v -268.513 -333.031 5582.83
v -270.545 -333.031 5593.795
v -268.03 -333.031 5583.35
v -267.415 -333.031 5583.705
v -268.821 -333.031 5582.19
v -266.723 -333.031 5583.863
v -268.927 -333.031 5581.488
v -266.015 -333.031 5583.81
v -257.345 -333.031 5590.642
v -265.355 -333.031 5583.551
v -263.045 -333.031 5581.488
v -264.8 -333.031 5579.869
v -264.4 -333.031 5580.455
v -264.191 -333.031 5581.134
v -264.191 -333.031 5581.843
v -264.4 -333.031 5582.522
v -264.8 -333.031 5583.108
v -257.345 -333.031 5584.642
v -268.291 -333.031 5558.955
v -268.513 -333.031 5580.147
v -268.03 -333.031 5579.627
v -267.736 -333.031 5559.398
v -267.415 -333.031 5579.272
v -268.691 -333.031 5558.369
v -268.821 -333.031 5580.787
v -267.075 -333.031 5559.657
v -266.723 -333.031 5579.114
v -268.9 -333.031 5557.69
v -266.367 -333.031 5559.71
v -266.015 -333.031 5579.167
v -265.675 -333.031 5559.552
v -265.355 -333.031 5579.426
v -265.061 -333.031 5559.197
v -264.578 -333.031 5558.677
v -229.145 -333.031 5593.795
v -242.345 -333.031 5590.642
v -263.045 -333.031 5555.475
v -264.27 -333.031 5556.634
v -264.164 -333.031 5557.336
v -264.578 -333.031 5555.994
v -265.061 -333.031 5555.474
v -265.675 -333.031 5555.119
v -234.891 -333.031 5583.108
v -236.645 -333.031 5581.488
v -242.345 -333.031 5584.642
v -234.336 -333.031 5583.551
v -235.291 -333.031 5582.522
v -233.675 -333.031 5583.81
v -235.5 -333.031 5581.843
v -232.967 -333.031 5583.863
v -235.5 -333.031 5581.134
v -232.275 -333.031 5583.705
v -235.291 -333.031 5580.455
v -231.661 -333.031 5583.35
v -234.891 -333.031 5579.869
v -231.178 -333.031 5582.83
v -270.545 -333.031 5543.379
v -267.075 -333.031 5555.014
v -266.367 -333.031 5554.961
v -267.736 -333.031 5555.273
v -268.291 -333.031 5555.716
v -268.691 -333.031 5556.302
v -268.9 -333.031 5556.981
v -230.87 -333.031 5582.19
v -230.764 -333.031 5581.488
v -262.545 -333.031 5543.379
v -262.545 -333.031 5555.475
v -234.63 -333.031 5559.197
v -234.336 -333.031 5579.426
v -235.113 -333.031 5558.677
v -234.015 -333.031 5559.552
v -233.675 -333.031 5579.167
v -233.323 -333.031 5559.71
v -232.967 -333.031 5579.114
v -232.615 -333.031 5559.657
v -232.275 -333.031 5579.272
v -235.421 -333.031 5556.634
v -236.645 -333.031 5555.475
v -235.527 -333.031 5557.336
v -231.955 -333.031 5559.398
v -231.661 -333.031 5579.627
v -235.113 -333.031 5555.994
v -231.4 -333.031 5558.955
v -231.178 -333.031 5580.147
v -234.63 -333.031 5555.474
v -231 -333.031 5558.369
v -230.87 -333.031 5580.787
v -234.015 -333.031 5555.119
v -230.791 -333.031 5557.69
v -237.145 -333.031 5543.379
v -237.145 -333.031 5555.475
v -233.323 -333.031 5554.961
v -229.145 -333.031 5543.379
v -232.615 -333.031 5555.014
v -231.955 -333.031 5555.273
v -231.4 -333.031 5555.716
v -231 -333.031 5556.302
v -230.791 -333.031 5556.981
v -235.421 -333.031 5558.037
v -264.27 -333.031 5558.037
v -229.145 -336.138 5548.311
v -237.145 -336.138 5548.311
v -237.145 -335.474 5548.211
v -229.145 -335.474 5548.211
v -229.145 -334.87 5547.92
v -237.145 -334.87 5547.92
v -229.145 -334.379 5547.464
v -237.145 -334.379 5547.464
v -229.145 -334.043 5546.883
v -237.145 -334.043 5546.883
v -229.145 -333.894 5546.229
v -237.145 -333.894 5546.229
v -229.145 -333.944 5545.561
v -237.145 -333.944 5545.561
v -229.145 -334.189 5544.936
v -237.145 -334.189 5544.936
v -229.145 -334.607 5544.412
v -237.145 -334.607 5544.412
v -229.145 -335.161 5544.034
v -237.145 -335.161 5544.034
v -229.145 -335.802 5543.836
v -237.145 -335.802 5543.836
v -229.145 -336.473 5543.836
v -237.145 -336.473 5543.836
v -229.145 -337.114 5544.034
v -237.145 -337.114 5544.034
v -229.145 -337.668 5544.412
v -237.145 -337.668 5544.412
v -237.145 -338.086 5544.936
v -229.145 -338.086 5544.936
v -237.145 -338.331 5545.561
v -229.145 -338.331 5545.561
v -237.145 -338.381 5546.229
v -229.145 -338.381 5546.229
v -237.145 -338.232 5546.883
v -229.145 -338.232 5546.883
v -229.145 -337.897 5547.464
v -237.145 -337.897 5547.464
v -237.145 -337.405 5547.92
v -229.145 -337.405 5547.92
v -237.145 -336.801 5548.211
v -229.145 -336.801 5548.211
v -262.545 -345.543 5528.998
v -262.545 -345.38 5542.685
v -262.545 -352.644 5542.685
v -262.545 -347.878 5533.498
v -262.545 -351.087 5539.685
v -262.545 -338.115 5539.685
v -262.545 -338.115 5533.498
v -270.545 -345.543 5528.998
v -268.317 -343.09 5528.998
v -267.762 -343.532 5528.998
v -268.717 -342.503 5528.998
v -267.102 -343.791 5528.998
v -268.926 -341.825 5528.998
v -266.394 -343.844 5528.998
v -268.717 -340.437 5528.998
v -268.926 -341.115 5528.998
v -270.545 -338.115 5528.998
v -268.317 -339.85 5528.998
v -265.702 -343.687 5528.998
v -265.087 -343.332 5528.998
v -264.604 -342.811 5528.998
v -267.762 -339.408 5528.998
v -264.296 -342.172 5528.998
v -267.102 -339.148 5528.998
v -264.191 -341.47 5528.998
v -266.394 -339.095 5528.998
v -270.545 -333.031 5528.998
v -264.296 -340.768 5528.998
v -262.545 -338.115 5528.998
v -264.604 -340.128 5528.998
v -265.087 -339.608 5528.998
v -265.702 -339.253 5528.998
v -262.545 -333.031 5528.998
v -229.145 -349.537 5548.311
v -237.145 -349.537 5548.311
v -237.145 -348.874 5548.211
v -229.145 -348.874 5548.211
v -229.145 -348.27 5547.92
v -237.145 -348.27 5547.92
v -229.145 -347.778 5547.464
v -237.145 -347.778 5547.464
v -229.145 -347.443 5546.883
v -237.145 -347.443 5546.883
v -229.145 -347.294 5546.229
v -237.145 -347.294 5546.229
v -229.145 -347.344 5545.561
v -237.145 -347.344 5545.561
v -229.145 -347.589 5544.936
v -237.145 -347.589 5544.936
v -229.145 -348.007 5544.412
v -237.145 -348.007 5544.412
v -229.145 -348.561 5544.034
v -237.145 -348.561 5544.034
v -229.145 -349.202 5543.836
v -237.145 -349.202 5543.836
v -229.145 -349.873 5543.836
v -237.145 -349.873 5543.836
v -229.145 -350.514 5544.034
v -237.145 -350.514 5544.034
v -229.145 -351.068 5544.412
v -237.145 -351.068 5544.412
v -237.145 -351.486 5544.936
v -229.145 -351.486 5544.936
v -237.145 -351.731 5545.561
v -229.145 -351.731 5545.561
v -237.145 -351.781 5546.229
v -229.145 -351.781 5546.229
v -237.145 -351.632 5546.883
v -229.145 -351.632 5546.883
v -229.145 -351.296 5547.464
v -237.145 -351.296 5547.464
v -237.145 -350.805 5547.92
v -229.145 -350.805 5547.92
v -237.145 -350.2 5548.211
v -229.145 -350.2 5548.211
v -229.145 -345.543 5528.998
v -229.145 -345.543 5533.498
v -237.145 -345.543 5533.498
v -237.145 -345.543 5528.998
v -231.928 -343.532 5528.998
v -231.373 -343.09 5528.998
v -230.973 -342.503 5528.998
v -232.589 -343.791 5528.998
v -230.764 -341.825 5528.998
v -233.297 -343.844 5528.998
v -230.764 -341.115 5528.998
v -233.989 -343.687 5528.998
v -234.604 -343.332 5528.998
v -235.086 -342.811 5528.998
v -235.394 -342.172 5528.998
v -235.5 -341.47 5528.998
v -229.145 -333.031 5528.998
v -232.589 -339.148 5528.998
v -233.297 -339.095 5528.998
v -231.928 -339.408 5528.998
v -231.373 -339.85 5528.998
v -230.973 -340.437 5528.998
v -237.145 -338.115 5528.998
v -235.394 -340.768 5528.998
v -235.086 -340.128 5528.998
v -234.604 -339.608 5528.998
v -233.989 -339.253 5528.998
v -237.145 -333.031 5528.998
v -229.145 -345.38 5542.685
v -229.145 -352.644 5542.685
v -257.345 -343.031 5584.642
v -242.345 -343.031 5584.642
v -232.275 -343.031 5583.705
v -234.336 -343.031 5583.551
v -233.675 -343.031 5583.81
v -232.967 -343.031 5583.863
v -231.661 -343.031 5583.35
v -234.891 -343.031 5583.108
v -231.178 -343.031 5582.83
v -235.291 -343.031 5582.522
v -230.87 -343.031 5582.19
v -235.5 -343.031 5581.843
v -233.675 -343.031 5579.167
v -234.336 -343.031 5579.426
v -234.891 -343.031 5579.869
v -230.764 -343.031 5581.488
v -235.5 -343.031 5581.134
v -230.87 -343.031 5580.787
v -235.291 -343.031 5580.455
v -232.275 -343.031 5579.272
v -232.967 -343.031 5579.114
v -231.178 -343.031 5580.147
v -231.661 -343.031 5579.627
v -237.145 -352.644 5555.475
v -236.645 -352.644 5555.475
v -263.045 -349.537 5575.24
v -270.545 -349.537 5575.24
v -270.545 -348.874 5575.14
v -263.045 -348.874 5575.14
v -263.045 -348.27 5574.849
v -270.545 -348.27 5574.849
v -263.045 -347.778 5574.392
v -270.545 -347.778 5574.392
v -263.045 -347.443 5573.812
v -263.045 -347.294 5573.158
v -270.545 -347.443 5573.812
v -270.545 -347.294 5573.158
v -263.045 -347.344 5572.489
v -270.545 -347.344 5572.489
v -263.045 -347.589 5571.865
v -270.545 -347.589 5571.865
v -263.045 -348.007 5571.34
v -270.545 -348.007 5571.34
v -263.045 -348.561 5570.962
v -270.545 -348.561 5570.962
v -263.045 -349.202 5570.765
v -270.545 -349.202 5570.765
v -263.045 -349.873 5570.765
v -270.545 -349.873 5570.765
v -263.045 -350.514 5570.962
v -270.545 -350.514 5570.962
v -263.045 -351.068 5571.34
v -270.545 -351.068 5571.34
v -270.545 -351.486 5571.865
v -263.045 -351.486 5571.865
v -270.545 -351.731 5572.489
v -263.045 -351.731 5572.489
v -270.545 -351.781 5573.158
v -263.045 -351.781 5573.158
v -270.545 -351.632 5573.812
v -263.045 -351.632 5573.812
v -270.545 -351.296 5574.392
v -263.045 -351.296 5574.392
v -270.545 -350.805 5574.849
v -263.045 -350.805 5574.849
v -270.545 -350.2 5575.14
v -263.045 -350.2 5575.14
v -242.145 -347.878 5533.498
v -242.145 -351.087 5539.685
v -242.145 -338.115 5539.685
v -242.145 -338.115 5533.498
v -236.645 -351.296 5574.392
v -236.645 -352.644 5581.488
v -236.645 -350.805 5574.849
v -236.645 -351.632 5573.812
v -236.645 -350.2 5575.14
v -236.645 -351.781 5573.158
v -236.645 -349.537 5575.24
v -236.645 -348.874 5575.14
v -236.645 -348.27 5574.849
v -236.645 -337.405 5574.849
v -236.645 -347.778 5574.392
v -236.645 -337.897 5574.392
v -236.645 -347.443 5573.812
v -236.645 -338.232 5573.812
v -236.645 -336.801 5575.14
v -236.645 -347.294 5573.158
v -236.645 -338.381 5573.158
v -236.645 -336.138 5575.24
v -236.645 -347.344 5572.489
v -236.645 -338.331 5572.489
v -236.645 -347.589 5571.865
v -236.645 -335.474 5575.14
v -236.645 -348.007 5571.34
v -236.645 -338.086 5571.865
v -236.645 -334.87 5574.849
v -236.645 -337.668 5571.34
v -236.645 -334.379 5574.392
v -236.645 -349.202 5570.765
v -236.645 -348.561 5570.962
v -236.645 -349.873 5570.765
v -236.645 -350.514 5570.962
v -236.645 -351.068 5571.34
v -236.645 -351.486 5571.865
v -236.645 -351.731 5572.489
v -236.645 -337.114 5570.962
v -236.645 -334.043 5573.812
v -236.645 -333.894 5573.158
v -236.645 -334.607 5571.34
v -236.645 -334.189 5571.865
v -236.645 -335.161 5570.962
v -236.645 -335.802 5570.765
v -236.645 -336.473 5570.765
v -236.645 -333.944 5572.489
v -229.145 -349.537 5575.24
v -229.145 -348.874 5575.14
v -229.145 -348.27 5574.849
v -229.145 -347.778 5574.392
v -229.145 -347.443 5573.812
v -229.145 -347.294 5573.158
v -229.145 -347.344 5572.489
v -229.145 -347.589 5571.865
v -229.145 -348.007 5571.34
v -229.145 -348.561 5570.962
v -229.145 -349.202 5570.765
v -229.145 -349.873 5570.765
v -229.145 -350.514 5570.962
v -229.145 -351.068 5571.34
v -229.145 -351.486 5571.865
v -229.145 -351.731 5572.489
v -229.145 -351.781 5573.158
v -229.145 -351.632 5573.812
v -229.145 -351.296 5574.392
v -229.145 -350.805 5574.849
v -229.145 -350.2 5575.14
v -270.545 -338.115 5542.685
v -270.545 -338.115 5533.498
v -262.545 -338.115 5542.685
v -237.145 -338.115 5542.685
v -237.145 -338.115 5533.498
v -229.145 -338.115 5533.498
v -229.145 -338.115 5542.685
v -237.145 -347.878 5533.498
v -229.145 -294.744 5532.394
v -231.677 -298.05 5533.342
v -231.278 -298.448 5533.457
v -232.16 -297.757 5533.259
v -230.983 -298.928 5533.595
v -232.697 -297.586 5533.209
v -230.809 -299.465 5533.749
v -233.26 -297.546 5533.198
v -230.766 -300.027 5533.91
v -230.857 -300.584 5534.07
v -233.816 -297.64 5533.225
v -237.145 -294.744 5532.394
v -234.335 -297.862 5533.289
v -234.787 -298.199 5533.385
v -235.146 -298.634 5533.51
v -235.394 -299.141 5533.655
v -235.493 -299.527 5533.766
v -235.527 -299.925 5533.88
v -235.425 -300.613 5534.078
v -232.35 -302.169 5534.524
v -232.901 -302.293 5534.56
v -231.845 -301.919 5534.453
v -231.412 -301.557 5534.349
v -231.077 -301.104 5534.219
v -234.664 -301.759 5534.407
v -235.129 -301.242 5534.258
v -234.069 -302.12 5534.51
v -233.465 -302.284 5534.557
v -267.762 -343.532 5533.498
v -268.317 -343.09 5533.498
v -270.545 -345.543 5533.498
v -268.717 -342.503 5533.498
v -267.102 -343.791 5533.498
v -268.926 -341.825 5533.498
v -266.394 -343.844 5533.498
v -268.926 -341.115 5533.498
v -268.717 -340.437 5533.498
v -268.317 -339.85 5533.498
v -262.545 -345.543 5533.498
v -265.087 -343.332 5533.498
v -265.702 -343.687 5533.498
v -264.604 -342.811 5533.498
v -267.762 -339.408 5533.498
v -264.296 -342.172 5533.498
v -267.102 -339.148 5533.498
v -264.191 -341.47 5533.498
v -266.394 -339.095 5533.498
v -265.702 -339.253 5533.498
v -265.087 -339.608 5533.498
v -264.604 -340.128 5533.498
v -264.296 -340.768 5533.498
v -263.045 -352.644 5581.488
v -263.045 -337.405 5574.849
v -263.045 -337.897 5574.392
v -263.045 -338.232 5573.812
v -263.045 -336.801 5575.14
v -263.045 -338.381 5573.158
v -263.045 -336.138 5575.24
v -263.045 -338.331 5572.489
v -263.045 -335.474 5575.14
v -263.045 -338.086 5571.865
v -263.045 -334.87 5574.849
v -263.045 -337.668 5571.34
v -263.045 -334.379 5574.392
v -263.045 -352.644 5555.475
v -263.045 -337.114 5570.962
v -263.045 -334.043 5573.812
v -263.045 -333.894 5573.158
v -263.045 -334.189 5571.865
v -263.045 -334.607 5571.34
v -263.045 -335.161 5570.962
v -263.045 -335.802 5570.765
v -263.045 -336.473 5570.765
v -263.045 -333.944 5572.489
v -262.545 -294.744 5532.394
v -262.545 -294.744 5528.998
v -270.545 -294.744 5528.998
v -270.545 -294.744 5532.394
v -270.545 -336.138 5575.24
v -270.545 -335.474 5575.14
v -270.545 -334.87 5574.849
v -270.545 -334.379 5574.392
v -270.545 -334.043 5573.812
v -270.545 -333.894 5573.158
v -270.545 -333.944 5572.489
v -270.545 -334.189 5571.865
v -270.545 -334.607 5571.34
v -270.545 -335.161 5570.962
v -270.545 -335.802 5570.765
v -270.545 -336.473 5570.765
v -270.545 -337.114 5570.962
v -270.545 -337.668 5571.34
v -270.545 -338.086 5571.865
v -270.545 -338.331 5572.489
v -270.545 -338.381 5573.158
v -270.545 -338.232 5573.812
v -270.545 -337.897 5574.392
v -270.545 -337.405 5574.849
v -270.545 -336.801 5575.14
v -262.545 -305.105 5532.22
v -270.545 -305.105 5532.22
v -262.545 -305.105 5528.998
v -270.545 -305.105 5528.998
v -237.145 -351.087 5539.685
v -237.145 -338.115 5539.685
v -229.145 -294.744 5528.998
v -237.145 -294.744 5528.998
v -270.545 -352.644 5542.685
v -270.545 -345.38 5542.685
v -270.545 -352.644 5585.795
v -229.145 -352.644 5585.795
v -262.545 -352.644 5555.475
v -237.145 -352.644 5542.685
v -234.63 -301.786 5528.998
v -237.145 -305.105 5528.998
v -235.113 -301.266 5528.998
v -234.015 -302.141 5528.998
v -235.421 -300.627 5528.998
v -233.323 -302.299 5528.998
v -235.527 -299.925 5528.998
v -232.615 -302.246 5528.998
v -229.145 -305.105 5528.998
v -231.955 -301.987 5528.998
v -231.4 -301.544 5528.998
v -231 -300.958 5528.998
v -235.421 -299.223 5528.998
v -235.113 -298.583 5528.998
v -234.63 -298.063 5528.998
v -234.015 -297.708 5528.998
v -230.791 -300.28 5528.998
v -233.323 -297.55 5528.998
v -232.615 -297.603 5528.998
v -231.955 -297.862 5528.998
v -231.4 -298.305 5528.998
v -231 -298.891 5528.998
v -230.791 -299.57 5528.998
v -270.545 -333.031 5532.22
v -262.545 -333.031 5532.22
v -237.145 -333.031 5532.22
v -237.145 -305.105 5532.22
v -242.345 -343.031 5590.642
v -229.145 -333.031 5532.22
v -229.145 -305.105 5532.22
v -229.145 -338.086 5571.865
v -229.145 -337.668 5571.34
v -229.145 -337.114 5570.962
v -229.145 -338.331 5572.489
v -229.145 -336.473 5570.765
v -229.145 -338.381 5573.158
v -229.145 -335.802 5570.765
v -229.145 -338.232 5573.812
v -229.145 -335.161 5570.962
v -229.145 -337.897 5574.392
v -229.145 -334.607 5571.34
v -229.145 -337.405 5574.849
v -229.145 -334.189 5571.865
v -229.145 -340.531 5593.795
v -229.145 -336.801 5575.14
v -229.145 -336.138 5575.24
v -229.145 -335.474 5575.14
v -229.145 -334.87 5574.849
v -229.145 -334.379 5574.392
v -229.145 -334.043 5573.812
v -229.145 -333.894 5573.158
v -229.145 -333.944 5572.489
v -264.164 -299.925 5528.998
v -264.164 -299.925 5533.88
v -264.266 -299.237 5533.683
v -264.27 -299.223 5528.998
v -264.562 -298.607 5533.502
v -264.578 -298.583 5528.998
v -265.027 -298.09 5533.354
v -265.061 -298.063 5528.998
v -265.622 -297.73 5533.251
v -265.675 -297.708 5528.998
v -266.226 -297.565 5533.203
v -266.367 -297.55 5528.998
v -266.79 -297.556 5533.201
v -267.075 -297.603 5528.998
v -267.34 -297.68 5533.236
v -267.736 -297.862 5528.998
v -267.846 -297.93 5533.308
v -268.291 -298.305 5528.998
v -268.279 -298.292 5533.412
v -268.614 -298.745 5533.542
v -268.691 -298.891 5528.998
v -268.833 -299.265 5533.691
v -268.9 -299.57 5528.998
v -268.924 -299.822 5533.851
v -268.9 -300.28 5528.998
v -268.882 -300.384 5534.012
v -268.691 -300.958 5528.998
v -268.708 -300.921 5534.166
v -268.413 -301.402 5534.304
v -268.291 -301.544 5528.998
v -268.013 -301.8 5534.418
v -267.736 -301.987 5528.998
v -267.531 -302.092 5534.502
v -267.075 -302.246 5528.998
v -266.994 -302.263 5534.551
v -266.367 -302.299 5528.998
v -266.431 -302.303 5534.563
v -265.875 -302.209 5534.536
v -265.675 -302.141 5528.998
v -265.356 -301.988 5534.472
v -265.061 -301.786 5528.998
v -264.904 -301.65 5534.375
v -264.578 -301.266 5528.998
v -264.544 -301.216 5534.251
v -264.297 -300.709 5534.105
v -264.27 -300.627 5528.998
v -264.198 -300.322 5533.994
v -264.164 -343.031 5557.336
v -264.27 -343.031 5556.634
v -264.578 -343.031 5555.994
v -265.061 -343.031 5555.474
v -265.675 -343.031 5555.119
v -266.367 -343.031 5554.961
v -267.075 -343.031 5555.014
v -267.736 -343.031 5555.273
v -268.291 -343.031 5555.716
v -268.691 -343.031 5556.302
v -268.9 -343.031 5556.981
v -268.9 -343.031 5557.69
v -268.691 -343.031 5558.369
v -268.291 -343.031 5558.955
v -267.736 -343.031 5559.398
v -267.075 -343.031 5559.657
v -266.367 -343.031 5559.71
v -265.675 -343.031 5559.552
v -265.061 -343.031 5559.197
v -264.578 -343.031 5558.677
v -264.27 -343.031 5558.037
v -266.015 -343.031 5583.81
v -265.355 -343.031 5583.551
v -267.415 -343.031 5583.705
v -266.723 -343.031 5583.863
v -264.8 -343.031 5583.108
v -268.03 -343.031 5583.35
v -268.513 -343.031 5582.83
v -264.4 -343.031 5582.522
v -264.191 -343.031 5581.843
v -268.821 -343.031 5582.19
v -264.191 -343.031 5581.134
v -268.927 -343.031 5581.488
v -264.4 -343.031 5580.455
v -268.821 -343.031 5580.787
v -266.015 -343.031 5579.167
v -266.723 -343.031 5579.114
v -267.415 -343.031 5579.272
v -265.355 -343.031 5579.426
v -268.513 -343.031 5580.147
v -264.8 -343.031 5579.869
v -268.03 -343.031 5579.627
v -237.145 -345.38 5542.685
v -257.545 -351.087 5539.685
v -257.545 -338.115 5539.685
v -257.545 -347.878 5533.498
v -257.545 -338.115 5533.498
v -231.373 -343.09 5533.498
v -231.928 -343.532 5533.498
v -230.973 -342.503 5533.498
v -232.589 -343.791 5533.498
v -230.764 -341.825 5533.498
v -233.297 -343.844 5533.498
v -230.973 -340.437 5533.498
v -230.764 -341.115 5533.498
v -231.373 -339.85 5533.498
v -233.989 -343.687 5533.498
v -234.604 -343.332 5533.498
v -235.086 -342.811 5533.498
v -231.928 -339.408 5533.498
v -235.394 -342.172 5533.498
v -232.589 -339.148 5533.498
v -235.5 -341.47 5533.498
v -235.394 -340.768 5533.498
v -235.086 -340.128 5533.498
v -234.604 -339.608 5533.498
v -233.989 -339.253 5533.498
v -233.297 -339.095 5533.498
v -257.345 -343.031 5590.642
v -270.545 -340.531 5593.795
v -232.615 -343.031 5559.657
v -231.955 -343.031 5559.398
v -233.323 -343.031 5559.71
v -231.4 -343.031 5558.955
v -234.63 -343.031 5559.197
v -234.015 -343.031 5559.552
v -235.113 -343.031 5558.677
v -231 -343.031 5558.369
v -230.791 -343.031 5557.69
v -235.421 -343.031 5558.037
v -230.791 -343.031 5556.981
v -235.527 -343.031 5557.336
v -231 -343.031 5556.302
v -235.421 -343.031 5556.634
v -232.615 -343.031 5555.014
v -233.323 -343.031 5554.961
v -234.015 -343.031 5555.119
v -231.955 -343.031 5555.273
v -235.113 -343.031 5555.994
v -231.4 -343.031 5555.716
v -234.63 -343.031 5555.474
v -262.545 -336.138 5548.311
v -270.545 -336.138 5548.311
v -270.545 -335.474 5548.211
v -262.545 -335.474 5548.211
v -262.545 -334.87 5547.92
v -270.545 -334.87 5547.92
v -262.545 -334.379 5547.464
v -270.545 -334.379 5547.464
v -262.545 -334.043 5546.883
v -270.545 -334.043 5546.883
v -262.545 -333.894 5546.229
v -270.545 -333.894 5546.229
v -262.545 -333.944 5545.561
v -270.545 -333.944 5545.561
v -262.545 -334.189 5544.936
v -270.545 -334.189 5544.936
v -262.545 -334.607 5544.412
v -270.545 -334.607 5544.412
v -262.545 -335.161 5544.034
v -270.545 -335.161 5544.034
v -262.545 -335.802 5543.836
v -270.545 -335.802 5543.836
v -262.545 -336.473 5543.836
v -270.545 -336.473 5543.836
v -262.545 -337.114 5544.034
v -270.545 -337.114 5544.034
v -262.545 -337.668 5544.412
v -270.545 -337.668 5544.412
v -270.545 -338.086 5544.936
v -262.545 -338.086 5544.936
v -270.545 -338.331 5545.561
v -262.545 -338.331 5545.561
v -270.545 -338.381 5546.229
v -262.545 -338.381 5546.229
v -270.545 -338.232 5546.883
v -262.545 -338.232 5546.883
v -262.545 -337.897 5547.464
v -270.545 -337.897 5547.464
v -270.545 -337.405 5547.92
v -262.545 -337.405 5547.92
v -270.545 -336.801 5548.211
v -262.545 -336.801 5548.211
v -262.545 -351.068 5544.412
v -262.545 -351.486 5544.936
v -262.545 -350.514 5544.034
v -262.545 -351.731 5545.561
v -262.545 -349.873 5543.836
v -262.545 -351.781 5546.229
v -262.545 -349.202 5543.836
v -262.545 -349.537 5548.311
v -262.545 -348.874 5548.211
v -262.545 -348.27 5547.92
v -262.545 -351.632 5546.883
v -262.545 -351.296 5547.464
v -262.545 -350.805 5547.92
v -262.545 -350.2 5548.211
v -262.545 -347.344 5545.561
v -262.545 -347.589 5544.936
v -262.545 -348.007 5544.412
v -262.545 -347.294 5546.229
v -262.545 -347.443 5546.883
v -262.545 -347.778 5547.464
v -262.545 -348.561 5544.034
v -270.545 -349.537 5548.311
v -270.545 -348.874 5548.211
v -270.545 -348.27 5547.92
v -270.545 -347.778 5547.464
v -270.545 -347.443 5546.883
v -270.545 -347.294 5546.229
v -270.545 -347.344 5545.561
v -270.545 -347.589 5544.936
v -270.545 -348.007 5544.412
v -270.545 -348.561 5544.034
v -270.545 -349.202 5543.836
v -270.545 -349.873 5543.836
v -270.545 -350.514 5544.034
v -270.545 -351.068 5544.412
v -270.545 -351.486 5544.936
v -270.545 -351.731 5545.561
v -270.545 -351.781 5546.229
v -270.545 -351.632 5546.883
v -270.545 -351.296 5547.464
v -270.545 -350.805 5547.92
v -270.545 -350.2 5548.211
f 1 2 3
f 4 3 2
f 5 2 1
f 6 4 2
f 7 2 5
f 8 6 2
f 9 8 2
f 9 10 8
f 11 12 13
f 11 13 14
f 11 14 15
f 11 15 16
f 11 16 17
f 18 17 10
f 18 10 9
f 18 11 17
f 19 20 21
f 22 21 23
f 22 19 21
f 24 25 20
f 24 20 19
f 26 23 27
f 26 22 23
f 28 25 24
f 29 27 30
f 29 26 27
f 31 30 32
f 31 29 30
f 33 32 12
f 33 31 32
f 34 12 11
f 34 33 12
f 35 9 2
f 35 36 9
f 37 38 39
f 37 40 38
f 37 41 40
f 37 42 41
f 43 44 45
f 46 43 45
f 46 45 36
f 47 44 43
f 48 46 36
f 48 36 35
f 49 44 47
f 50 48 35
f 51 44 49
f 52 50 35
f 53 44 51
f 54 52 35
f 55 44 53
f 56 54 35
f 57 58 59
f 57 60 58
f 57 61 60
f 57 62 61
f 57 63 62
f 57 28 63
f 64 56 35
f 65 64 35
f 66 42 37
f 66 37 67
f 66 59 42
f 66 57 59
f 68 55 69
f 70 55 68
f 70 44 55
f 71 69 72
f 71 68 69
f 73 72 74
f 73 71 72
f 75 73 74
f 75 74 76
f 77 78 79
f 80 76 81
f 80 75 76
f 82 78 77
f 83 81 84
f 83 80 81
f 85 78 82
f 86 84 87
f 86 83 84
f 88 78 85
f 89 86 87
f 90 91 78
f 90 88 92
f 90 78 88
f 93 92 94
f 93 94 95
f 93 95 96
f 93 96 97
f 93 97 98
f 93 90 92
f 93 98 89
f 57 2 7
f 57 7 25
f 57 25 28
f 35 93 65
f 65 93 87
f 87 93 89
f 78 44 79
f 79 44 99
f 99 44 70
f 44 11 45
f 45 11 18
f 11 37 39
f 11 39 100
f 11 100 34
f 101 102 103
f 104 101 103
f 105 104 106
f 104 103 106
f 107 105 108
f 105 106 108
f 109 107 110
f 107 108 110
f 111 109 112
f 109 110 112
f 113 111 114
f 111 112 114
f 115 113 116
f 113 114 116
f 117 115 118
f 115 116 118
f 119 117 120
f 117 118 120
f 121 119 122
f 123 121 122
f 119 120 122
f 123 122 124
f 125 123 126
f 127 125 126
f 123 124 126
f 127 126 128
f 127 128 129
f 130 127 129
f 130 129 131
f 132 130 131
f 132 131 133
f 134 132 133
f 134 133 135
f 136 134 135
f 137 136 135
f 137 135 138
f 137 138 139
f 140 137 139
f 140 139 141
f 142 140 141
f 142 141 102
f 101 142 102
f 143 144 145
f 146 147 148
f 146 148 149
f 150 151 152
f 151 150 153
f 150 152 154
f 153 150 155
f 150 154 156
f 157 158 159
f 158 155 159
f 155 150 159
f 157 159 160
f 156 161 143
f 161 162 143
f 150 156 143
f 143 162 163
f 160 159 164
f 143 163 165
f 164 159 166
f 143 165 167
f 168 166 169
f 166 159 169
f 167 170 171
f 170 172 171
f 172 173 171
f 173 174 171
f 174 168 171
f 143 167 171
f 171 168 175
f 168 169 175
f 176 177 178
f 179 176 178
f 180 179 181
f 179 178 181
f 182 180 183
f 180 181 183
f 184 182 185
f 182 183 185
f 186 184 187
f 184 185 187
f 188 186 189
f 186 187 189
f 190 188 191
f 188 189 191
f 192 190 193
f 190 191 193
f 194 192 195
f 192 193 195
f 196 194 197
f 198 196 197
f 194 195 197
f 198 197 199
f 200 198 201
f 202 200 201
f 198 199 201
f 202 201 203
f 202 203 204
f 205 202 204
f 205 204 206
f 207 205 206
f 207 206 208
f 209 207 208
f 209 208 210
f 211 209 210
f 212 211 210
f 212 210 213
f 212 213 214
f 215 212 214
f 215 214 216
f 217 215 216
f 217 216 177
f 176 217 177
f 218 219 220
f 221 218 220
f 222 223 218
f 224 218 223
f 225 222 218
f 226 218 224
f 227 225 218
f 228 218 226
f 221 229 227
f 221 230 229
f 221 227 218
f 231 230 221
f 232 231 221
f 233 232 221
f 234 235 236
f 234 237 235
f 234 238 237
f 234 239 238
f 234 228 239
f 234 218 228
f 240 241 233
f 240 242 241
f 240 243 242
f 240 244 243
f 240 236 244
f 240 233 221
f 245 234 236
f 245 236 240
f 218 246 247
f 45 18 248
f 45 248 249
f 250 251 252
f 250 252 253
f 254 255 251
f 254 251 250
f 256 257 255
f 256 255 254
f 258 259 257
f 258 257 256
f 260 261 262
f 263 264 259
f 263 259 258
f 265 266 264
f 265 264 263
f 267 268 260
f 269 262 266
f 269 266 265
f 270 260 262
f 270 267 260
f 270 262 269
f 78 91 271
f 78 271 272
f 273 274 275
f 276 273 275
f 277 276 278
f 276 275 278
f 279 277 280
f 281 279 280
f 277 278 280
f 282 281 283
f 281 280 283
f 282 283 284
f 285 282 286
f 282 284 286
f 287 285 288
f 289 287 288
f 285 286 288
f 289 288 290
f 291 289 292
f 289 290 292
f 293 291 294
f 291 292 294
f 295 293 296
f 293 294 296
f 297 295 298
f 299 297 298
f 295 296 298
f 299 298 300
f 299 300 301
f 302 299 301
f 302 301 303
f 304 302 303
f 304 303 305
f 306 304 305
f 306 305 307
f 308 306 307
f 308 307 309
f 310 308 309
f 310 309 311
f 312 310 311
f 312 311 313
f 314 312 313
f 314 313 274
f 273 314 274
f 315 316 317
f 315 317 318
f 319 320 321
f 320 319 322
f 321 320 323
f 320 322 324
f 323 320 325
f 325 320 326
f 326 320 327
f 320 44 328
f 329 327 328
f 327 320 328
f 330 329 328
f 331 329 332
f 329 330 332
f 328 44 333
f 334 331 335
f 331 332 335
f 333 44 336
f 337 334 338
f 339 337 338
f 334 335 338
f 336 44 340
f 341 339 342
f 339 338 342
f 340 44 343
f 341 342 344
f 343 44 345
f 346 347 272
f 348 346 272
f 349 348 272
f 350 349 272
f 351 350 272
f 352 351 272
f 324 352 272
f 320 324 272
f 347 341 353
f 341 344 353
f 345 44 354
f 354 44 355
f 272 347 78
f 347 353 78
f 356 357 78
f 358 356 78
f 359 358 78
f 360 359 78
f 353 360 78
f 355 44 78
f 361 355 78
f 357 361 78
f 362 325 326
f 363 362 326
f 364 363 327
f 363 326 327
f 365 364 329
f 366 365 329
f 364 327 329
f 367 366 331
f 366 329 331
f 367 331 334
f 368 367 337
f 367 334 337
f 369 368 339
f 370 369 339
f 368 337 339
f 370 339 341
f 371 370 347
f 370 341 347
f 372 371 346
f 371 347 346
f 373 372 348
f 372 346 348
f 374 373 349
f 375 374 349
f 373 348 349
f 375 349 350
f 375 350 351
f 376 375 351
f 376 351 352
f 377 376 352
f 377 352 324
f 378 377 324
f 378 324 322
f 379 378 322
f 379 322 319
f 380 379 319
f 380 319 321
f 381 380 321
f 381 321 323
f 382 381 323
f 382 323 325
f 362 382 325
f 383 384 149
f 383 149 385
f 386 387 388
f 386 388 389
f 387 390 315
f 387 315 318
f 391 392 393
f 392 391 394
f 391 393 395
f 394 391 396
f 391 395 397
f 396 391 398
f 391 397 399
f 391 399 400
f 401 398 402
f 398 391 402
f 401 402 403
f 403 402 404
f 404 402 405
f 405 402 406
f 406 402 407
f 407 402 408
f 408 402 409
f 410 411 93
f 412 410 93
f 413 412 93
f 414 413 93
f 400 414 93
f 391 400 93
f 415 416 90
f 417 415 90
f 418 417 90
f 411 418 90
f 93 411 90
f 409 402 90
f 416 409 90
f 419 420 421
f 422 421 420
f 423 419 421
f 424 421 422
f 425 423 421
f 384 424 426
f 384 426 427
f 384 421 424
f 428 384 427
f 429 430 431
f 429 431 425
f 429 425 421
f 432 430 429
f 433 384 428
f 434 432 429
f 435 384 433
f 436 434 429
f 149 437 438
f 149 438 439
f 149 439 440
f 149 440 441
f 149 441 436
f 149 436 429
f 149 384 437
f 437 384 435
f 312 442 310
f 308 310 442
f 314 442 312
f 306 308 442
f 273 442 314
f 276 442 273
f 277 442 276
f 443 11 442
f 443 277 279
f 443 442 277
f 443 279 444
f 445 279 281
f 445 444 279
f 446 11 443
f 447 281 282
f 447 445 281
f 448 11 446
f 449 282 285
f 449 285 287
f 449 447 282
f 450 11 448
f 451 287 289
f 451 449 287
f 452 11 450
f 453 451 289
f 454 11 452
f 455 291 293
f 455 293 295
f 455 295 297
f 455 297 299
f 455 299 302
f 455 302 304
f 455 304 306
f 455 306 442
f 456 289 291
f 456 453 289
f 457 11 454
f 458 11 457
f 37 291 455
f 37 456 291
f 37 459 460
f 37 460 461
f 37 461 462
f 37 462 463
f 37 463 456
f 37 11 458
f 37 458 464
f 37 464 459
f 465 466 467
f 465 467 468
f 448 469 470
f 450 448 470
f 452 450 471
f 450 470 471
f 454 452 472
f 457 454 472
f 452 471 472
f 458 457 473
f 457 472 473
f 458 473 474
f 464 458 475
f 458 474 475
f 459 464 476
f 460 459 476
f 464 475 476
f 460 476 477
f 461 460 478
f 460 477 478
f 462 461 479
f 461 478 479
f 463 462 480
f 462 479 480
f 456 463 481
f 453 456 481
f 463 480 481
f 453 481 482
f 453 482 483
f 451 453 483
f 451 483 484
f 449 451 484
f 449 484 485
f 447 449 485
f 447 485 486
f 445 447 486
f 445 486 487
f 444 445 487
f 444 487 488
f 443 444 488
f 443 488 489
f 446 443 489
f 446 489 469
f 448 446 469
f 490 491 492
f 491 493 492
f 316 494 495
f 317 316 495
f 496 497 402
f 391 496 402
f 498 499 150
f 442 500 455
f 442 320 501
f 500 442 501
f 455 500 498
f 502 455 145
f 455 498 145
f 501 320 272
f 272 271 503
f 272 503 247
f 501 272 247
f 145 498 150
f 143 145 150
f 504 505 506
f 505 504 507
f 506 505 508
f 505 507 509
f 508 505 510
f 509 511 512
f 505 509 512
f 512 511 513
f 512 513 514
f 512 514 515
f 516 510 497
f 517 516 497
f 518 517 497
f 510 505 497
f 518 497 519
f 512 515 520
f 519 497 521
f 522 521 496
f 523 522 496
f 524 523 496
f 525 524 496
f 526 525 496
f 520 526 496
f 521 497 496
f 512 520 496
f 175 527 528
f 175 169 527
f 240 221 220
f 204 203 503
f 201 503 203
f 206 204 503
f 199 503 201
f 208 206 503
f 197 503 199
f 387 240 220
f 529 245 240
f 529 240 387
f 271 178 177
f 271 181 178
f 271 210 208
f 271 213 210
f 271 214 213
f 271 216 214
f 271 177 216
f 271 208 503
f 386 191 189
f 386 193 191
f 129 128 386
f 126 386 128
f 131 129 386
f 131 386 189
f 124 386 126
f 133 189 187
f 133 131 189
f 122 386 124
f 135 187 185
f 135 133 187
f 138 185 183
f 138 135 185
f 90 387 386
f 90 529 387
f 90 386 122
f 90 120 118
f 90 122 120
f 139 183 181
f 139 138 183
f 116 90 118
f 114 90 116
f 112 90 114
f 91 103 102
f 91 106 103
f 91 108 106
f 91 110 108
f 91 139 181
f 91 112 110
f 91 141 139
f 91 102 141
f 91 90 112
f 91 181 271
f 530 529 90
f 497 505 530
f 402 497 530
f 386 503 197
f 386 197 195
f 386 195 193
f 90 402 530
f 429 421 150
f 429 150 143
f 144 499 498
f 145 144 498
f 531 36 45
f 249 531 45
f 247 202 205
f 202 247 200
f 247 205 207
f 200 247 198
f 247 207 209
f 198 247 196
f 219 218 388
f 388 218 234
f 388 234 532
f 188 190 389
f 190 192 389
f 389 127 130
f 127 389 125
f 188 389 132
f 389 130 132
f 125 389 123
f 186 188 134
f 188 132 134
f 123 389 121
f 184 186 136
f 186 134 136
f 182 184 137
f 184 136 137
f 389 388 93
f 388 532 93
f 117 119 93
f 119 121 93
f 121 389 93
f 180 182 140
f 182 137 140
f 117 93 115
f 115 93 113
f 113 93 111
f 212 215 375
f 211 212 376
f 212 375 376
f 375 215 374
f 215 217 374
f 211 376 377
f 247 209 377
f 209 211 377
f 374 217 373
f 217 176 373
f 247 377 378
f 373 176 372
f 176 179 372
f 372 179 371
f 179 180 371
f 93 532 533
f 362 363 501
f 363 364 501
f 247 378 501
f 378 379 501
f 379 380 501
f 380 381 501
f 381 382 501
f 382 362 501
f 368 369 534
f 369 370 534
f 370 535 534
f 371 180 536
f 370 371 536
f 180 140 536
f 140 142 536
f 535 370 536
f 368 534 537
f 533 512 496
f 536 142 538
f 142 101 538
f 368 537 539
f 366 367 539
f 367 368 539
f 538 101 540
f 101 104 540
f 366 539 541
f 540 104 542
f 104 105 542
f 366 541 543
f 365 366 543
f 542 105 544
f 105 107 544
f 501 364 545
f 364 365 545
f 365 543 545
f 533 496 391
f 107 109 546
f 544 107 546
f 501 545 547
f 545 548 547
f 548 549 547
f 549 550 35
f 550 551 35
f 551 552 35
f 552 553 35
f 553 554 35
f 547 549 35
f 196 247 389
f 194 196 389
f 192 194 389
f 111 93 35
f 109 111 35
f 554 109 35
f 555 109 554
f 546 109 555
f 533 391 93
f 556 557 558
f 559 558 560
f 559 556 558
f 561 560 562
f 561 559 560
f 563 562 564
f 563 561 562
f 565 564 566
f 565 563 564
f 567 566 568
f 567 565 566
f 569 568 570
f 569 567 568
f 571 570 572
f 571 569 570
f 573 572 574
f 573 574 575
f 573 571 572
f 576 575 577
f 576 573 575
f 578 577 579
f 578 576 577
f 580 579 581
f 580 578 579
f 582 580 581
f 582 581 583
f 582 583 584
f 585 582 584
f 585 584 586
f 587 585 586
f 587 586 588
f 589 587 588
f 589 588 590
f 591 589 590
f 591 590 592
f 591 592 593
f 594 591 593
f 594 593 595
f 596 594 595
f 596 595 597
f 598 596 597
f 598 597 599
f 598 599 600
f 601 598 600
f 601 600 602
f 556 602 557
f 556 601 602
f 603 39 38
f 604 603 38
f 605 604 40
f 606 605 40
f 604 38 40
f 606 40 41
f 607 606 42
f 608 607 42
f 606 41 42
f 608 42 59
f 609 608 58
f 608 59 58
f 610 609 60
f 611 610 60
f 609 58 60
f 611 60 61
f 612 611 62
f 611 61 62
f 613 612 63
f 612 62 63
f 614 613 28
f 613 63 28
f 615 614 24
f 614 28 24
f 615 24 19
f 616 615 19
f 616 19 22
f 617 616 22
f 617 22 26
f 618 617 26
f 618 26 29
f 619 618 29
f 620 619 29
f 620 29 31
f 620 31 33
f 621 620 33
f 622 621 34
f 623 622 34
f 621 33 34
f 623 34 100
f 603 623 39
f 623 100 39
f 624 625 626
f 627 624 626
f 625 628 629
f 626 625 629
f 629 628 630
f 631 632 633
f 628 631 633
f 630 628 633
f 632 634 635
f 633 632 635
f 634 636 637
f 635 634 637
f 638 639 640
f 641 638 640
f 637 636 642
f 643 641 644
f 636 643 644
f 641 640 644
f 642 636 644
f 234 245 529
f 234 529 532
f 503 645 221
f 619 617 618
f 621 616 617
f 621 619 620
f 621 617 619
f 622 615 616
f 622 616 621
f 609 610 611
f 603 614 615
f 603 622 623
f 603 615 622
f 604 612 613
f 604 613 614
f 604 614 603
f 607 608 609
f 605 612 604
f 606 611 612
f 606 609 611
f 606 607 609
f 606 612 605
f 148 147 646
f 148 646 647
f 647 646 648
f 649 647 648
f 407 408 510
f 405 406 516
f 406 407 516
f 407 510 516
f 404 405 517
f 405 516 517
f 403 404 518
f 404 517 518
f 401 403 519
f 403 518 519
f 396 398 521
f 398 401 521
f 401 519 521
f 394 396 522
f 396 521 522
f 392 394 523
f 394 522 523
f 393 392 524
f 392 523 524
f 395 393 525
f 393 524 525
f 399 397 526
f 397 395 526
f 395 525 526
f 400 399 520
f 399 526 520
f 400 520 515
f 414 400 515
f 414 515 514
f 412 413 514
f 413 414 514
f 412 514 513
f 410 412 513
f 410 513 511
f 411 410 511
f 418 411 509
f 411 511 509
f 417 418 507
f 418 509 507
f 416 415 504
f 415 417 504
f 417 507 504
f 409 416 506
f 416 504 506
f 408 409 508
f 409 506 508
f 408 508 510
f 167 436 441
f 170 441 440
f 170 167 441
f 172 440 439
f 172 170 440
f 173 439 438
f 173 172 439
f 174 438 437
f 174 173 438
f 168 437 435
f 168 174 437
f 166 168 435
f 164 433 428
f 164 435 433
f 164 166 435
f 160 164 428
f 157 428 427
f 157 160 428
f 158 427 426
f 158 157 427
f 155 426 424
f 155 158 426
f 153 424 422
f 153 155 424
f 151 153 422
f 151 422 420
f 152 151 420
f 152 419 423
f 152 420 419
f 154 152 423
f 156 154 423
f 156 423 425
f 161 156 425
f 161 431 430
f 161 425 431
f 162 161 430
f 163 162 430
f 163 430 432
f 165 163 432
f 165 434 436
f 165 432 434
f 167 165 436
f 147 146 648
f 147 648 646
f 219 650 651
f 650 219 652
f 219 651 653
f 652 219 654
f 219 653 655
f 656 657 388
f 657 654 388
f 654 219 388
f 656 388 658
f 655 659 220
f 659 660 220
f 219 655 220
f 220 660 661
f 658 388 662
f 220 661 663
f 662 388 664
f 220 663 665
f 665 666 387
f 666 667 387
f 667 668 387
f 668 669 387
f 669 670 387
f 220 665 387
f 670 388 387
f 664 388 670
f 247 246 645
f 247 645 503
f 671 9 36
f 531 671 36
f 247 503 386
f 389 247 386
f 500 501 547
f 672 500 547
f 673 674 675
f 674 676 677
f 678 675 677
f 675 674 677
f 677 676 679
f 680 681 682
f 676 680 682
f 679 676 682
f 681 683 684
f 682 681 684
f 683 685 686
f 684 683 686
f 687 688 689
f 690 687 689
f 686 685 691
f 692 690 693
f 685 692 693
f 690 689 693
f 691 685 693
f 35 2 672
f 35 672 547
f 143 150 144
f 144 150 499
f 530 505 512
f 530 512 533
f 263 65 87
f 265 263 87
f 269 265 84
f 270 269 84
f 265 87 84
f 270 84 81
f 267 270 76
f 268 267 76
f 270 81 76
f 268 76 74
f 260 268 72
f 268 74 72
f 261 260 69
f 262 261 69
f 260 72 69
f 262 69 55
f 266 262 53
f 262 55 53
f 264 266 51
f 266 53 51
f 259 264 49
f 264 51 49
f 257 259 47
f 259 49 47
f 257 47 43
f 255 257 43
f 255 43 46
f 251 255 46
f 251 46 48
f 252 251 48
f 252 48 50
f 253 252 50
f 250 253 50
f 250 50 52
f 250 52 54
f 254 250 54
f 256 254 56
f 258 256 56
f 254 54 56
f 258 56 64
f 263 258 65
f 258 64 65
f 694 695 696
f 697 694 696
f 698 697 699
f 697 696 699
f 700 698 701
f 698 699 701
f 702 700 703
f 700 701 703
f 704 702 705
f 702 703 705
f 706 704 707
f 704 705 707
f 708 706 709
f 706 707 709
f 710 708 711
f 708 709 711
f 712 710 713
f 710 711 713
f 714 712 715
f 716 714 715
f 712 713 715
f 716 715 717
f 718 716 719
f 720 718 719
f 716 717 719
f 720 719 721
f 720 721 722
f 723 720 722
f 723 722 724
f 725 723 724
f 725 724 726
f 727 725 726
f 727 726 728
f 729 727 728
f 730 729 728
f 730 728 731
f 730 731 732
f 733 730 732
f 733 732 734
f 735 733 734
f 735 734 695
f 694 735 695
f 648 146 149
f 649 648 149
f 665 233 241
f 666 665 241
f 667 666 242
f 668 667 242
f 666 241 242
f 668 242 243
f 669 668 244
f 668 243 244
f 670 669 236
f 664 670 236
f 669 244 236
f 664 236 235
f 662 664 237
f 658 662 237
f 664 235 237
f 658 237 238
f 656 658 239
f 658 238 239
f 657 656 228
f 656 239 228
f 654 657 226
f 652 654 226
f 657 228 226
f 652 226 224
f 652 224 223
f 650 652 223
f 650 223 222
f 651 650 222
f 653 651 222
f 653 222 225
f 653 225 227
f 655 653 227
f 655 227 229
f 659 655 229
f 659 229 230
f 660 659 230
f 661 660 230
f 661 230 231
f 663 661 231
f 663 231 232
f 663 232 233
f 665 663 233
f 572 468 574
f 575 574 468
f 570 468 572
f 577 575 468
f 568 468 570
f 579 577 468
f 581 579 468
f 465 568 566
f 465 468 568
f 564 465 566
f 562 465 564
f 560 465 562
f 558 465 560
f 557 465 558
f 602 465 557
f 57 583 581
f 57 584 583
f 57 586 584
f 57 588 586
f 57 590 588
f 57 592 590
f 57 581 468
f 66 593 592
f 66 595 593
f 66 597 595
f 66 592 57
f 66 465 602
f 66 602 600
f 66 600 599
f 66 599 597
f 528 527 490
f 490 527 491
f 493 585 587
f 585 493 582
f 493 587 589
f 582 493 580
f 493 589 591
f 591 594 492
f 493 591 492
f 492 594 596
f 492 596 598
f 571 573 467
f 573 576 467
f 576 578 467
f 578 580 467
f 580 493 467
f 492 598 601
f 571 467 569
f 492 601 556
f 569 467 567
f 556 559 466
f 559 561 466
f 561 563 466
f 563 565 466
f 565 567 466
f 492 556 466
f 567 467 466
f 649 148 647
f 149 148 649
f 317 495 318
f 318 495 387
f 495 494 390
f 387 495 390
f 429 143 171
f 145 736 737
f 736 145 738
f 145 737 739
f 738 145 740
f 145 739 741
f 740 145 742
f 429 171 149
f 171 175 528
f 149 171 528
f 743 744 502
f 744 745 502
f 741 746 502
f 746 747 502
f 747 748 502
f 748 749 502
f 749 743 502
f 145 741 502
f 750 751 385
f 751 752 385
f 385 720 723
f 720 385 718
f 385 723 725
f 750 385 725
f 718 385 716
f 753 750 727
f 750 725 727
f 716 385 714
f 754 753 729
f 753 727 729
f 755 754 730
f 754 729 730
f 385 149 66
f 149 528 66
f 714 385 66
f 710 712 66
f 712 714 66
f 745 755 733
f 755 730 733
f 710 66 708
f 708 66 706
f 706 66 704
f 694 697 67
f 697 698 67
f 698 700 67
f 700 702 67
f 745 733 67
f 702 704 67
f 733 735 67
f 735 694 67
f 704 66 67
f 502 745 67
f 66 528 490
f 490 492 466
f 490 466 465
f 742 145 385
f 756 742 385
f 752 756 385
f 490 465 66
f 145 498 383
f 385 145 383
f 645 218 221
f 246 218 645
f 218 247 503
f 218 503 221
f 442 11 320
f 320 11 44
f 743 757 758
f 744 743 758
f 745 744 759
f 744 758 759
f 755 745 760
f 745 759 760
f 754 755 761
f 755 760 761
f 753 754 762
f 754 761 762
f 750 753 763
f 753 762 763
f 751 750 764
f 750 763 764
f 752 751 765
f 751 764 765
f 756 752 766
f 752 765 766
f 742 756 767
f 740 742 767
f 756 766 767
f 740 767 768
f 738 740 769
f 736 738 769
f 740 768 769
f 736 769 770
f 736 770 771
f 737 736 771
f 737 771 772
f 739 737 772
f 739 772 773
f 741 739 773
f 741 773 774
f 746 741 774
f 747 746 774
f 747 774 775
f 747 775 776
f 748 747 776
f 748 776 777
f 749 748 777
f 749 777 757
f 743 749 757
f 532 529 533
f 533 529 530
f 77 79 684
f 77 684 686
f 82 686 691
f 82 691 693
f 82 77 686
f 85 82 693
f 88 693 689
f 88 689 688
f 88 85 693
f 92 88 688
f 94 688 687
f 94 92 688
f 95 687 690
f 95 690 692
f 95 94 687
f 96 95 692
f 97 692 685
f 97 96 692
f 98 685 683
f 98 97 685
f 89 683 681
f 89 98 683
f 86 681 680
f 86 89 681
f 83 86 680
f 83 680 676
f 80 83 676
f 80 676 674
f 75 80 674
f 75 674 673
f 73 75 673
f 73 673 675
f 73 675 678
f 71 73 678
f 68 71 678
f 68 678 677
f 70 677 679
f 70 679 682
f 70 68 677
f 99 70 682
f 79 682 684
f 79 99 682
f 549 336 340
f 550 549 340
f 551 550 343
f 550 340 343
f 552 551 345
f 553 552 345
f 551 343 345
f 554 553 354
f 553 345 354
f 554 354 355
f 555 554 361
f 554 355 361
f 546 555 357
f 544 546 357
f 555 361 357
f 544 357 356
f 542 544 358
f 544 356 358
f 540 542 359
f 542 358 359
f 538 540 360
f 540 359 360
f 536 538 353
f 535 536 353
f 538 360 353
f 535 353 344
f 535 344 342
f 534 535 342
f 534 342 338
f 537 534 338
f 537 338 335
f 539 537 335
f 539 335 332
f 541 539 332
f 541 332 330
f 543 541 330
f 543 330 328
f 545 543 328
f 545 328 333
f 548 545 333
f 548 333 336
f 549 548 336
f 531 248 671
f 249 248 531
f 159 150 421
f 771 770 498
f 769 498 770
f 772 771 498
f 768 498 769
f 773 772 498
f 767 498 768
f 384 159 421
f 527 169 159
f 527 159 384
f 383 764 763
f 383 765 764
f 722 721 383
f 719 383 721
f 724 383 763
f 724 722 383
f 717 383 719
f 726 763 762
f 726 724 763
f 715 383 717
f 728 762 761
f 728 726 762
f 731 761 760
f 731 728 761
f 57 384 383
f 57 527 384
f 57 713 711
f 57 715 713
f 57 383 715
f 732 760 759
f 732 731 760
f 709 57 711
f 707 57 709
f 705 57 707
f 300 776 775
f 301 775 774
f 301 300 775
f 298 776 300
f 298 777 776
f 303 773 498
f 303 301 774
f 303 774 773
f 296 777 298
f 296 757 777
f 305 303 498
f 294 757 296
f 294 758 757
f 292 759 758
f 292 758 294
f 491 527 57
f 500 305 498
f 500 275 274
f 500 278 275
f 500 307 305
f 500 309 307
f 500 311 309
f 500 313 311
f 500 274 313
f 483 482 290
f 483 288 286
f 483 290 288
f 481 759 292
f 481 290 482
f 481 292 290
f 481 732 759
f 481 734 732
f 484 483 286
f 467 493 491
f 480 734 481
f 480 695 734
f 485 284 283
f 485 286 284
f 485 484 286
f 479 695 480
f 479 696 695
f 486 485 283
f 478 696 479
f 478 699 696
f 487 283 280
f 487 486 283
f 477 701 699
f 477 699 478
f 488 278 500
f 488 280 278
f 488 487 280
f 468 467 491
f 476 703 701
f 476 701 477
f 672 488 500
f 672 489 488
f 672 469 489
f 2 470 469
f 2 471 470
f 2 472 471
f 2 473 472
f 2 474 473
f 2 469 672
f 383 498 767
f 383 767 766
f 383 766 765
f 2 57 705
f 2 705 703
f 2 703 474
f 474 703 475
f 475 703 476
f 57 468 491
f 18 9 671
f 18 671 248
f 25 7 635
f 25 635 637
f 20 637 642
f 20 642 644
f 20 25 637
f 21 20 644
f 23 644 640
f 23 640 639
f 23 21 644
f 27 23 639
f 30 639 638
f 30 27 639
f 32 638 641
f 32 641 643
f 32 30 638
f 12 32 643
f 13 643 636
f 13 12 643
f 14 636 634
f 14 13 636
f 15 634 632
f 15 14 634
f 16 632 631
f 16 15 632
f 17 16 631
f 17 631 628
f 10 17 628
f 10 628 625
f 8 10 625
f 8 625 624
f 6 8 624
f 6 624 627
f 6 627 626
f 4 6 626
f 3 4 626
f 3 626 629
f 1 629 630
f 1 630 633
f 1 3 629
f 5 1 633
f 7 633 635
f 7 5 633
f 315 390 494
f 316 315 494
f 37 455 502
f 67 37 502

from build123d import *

# Parameters (mm, degrees)
SKETCH1_W             = 7.5
SKETCH1_H             = 7.5
BOSS_EXTRUDE1_DEPTH   = 5.5
BOSS_EXTRUDE1_2_DEPTH = 5.5
BOSS_EXTRUDE1_3_DEPTH = 5.5
BOSS_EXTRUDE1_4_DEPTH = 5.5
BOSS_EXTRUDE2_START   = -5.5
SKETCH2_W             = 8
SKETCH2_H             = 7.5
BOSS_EXTRUDE2_DEPTH   = 50.5
SKETCH3_W             = 41.4
SKETCH3_H             = 7.5
BOSS_EXTRUDE3_DEPTH   = 16
BOSS_EXTRUDE4_DEPTH   = 8
SKETCH5_R             = 2.5
CUT_EXTRUDE1_DEPTH    = 8
SKETCH6_W             = 38.1096
SKETCH6_H             = 12.112327922
BOSS_EXTRUDE6_DEPTH   = 8
SKETCH9_W             = 41.4
SKETCH9_H             = 12.112327922
BOSS_EXTRUDE7_DEPTH   = 8
SKETCH10_R            = 2.25
CUT_EXTRUDE2_DEPTH    = 42.4
BOSS_EXTRUDE8_DEPTH   = 8
BOSS_EXTRUDE9_DEPTH   = 8
SKETCH13_W            = 4.925533285
SKETCH13_H            = 27.926
CUT_EXTRUDE3_DEPTH    = 42.4
BOSS_EXTRUDE10_DEPTH  = 41.4
SKETCH16_W            = 26.4
SKETCH16_H            = 26.013663936
CUT_EXTRUDE5_DEPTH    = 20.612327922
SKETCH17_W            = 25.4
SKETCH17_H            = 5.5
CUT_EXTRUDE6_DEPTH    = 50
SKETCH18_W            = 41.4
SKETCH18_H            = 1.703308899
CUT_EXTRUDE7_DEPTH    = 50
SKETCH19_R            = 2.38125
CUT_EXTRUDE8_DEPTH    = 50
SKETCH21_W            = 10.687091101
SKETCH21_H            = 14.528220305
CUT_EXTRUDE10_DEPTH   = 55
SKETCH22_W            = 8
SKETCH22_H            = 4.5
BOSS_EXTRUDE11_DEPTH  = 7.42786537
SKETCH23_R            = 2.38125
CUT_EXTRUDE11_DEPTH   = 5
SKETCH25_W            = 6.187091101
SKETCH25_H            = 14.528220305
BOSS_EXTRUDE12_DEPTH  = 5
SKETCH26_W            = 3
SKETCH26_H            = 14.528220305
CUT_EXTRUDE12_DEPTH   = 42.4
BOSS_EXTRUDE15_DEPTH  = 8
CUT_EXTRUDE13_DEPTH   = 34.4
SKETCH29_W            = 15
SKETCH29_H            = 6
CUT_EXTRUDE14_DEPTH   = 10
SKETCH30_R            = 2.38125
CUT_EXTRUDE15_DEPTH   = 10
SKETCH31_R            = 2.38125
CUT_EXTRUDE16_DEPTH   = 10


with BuildPart() as part:
    # Sketch1 → Boss-Extrude1 (new body)
    with BuildSketch(Plane(origin=(-474.147028746, -1016.113518437, 5527.294851894), x_dir=(1, 0, 0), z_dir=(0, 0, 1))):
        with Locations((215.351694909, 679.332213979)):
            Rectangle(SKETCH1_W, SKETCH1_H)
    extrude(amount=BOSS_EXTRUDE1_DEPTH)

    # Sketch2 → Boss-Extrude2 (add)
    with BuildSketch(Plane.XY.offset(5532.794851894).offset(BOSS_EXTRUDE2_START)):
        with Locations((-233.145333837, -336.781304458)):
            Rectangle(SKETCH2_W, SKETCH2_H)
        with Locations((-266.545333837, -336.781304458)):
            Rectangle(SKETCH2_W, SKETCH2_H)
    boss_extrude2 = extrude(amount=BOSS_EXTRUDE2_DEPTH)

    # Sketch3 → Boss-Extrude3 (add)
    with BuildSketch(Plane.XY.offset(5577.794851894)):
        with Locations((-249.845333837, -336.781304458)):
            Rectangle(SKETCH3_W, SKETCH3_H)
    extrude(amount=BOSS_EXTRUDE3_DEPTH)



with BuildPart() as body_2:
    # Sketch1 → Boss-Extrude1 2 (new body)
    with BuildSketch(Plane(origin=(-474.147028746, -1016.113518437, 5527.294851894), x_dir=(1, 0, 0), z_dir=(0, 0, 1))):
        with Locations((233.251694909, 679.332213979)):
            Rectangle(SKETCH1_W, SKETCH1_H)
    extrude(amount=BOSS_EXTRUDE1_2_DEPTH)


with BuildPart() as body_3:
    # Sketch1 → Boss-Extrude1 3 (new body)
    with BuildSketch(Plane(origin=(-474.147028746, -1016.113518437, 5527.294851894), x_dir=(1, 0, 0), z_dir=(0, 0, 1))):
        with Locations((233.251694909, 714.758213979)):
            Rectangle(SKETCH1_W, SKETCH1_H)
    extrude(amount=BOSS_EXTRUDE1_3_DEPTH)


with BuildPart() as body_4:
    # Sketch1 → Boss-Extrude1 4 (new body)
    with BuildSketch(Plane(origin=(-474.147028746, -1016.113518437, 5527.294851894), x_dir=(1, 0, 0), z_dir=(0, 0, 1))):
        with Locations((215.351694909, 714.758213979)):
            Rectangle(SKETCH1_W, SKETCH1_H)
    extrude(amount=BOSS_EXTRUDE1_4_DEPTH)


with BuildPart() as part_1:
    add(part.part)

    add(body_4.part)  # Boss-Extrude4 merges body 4
    # Sketch4 → Boss-Extrude4 (add)
    with BuildSketch(Plane.ZY.offset(262.545333837)):
        Polygon((5527.294851894, -333.031304458), (5527.294851894, -294.74397633), (5532.394065696, -294.74397633), (5543.378858785, -333.031304458), align=None)
    boss_extrude4 = extrude(amount=BOSS_EXTRUDE4_DEPTH)

    # Mirror1: Boss-Extrude2, Boss-Extrude4 across plane
    add(boss_extrude2.mirror(Plane.ZY.offset(249.845333837)))
    add(boss_extrude4.mirror(Plane.ZY.offset(249.845333837)))


with BuildPart() as cut_extrude1_tool:
    # Sketch5 → Cut-Extrude1 (new body)
    with BuildSketch(Plane.XY.offset(5532.794851894)):
        with Locations((-258.795333837, -301.355304458)):
            Circle(SKETCH5_R)
        with Locations((-240.895333837, -301.355304458)):
            Circle(SKETCH5_R)
        with Locations((-240.895333837, -336.781304458)):
            Circle(SKETCH5_R)
        with Locations((-258.795333837, -336.781304458)):
            Circle(SKETCH5_R)
    extrude(amount=-CUT_EXTRUDE1_DEPTH)


with BuildPart() as part_2:
    add(part_1.part)

    # Cut-Extrude1: cut by cut_extrude1_tool
    add(cut_extrude1_tool.part, mode=Mode.SUBTRACT)

    # Sketch6 → Boss-Extrude6 (add)
    with BuildSketch(Plane.ZY.offset(270.545333837)):
        with Locations((5558.740051894, -346.587468419)):
            Rectangle(SKETCH6_W, SKETCH6_H)
    boss_extrude6 = extrude(amount=-BOSS_EXTRUDE6_DEPTH)

    # Mirror2: Boss-Extrude6 across plane
    add(boss_extrude6.mirror(Plane.ZY.offset(249.845333837)))

    # Sketch9 → Boss-Extrude7 (add)
    with BuildSketch(Plane.XY.offset(5577.794851894)):
        with Locations((-249.845333837, -346.587468419)):
            Rectangle(SKETCH9_W, SKETCH9_H)
    extrude(amount=BOSS_EXTRUDE7_DEPTH)

    # Sketch10 → Cut-Extrude2 (cut, through all)
    with BuildSketch(Plane.ZY.offset(270.545333837)):
        with Locations((5546.061207304, -349.537271609)):
            Circle(SKETCH10_R)
        with Locations((5572.989599872, -349.537271609)):
            Circle(SKETCH10_R)
        with Locations((5546.061207304, -336.137665229)):
            Circle(SKETCH10_R)
        with Locations((5572.989599872, -336.137665229)):
            Circle(SKETCH10_R)
    extrude(amount=-CUT_EXTRUDE2_DEPTH, mode=Mode.SUBTRACT)

    # Sketch11 → Boss-Extrude8 (add)
    with BuildSketch(Plane.ZY.offset(270.545333837)):
        Polygon((5527.294851894, -340.372465198), (5539.685251894, -352.64363238), (5539.685251894, -340.531304458), align=None)
    extrude(amount=-BOSS_EXTRUDE8_DEPTH)



with BuildPart() as body_2_1:
    add(body_2.part)

    # Cut-Extrude1: cut by cut_extrude1_tool
    add(cut_extrude1_tool.part, mode=Mode.SUBTRACT)


with BuildPart() as body_3_1:
    add(body_3.part)

    # Cut-Extrude1: cut by cut_extrude1_tool
    add(cut_extrude1_tool.part, mode=Mode.SUBTRACT)


with BuildPart() as part_3:
    add(part_2.part)

    add(body_2_1.part)  # Boss-Extrude9 merges body 2
    # Sketch12 → Boss-Extrude9 (add)
    with BuildSketch(Plane(origin=(-229.145333837, 0, 0), x_dir=(0, 0, -1), z_dir=(1, 0, 0))):
        Polygon((-5539.685251894, -352.64363238), (-5527.294851894, -340.531304458), (-5539.685251894, -340.531304458), align=None)
    extrude(amount=-BOSS_EXTRUDE9_DEPTH)

    # Sketch13 → Cut-Extrude3 (cut, through all)
    with BuildSketch(Plane.ZY.offset(270.545333837)):
        with Locations((5529.757618536, -319.068304458)):
            Rectangle(SKETCH13_W, SKETCH13_H)
    extrude(amount=-CUT_EXTRUDE3_DEPTH, mode=Mode.SUBTRACT)

    # Sketch14 → Boss-Extrude10 (add)
    with BuildSketch(Plane.ZY.offset(270.545333837)):
        Polygon((5585.794851894, -352.64363238), (5593.794851894, -340.531304458), (5585.794851894, -340.531304458), align=None)
    extrude(amount=-BOSS_EXTRUDE10_DEPTH)

    # Sketch16 → Cut-Extrude5 (cut, through all)
    with BuildSketch(Plane(origin=(0, -333.031304458, 0), x_dir=(1, 0, 0), z_dir=(0, 1, 0))):
        with Locations((-249.845333837, -5568.481626817)):
            Rectangle(SKETCH16_W, SKETCH16_H)
    extrude(amount=-CUT_EXTRUDE5_DEPTH, mode=Mode.SUBTRACT)


with BuildPart() as cut_extrude6_tool:
    # Sketch17 → Cut-Extrude6 (new body)
    with BuildSketch(Plane(origin=(0, -297.605304458, 0), x_dir=(1, 0, 0), z_dir=(0, 1, 0))):
        with Locations((-249.845333837, -5530.044851894)):
            Rectangle(SKETCH17_W, SKETCH17_H)
    extrude(amount=-CUT_EXTRUDE6_DEPTH)


with BuildPart() as part_4:
    add(part_3.part)

    # Cut-Extrude6: cut by cut_extrude6_tool
    add(cut_extrude6_tool.part, mode=Mode.SUBTRACT)

    # Sketch18 → Cut-Extrude7 (cut)
    with BuildSketch(Plane(origin=(0, -294.74397633, 0), x_dir=(1, 0, 0), z_dir=(0, 1, 0))):
        with Locations((-249.845333837, -5528.146506344)):
            Rectangle(SKETCH18_W, SKETCH18_H)
    extrude(amount=-CUT_EXTRUDE7_DEPTH, mode=Mode.SUBTRACT)

    # Sketch19 → Cut-Extrude8 (cut)
    with BuildSketch(Plane(origin=(0, 0, 5528.998160793), x_dir=(-1, 0, 0), z_dir=(0, 0, -1))):
        with Locations((233.145333837, -299.924640394)):
            Circle(SKETCH19_R)
    cut_extrude8 = extrude(amount=-CUT_EXTRUDE8_DEPTH, mode=Mode.SUBTRACT)

    # Sketch21 → Cut-Extrude10 (cut)
    with BuildSketch(Plane.ZY.offset(270.545333837)):
        with Locations((5534.341706344, -345.379522228)):
            Rectangle(SKETCH21_W, SKETCH21_H)
    extrude(amount=-CUT_EXTRUDE10_DEPTH, mode=Mode.SUBTRACT)

    # Sketch22 → Boss-Extrude11 (add)
    with BuildSketch(Plane.XZ.offset(338.115412075)):
        with Locations((-266.545333837, 5531.248160793)):
            Rectangle(SKETCH22_W, SKETCH22_H)
    boss_extrude11 = extrude(amount=BOSS_EXTRUDE11_DEPTH)

    # Mirror5: Boss-Extrude11 across plane
    add(boss_extrude11.mirror(Plane.ZY.offset(249.845333837)))

    # Sketch23 → Cut-Extrude11 (cut)
    with BuildSketch(Plane(origin=(0, 0, 5528.998160793), x_dir=(-1, 0, 0), z_dir=(0, 0, -1))):
        with Locations((233.118864035, -341.469886082)):
            Circle(SKETCH23_R)
    cut_extrude11 = extrude(amount=-CUT_EXTRUDE11_DEPTH, mode=Mode.SUBTRACT)

    # Sketch26 → Cut-Extrude12 (cut, through all)
    with BuildSketch(Plane.ZY.offset(270.545333837)):
        with Locations((5541.185251894, -345.379522228)):
            Rectangle(SKETCH26_W, SKETCH26_H)
    extrude(amount=-CUT_EXTRUDE12_DEPTH, mode=Mode.SUBTRACT)

    # Mirror6: Cut-Extrude11 across plane
    add(cut_extrude11.mirror(Plane.ZY.offset(249.845333837)), mode=Mode.SUBTRACT)

    # Sketch29 → Cut-Extrude14 (cut)
    with BuildSketch(Plane(origin=(0, -333.031304458, 0), x_dir=(1, 0, 0), z_dir=(0, 1, 0))):
        with Locations((-249.845333837, -5587.64165534)):
            Rectangle(SKETCH29_W, SKETCH29_H)
    extrude(amount=-CUT_EXTRUDE14_DEPTH, mode=Mode.SUBTRACT)

    # Sketch30 → Cut-Extrude15 (cut)
    with BuildSketch(Plane(origin=(0, -333.031304458, 0), x_dir=(1, 0, 0), z_dir=(0, 1, 0))):
        with Locations((-266.545333837, -5557.335586136)):
            Circle(SKETCH30_R)
    cut_extrude15 = extrude(amount=-CUT_EXTRUDE15_DEPTH, mode=Mode.SUBTRACT)

    # Sketch31 → Cut-Extrude16 (cut)
    with BuildSketch(Plane(origin=(0, -333.031304458, 0), x_dir=(1, 0, 0), z_dir=(0, 1, 0))):
        with Locations((-233.145333837, -5581.488458785)):
            Circle(SKETCH31_R)
    cut_extrude16 = extrude(amount=-CUT_EXTRUDE16_DEPTH, mode=Mode.SUBTRACT)

    # Mirror12: Cut-Extrude15, Cut-Extrude16 across plane
    add(cut_extrude15.mirror(Plane.ZY.offset(249.845333837)), mode=Mode.SUBTRACT)
    add(cut_extrude16.mirror(Plane.ZY.offset(249.845333837)), mode=Mode.SUBTRACT)

    # Mirror13: Cut-Extrude8 across plane
    add(cut_extrude8.mirror(Plane.ZY.offset(249.845333837)), mode=Mode.SUBTRACT)


with BuildPart() as body_3_2:
    add(body_3_1.part)

    # Cut-Extrude6: cut by cut_extrude6_tool
    add(cut_extrude6_tool.part, mode=Mode.SUBTRACT)


with BuildPart() as body_2_2:
    # Sketch25 → Boss-Extrude12 (new body)
    with BuildSketch(Plane(origin=(-262.545333837, 0, 0), x_dir=(0, 0, -1), z_dir=(1, 0, 0))):
        with Locations((-5536.591706344, -345.379522228)):
            Rectangle(SKETCH25_W, SKETCH25_H)
    extrude(amount=BOSS_EXTRUDE12_DEPTH)

    # Sketch28 → Cut-Extrude13 (cut, through all)
    with BuildSketch(Plane.ZY.offset(262.545333837)):
        Polygon((5533.498160793, -347.87771045), (5539.685251894, -351.08734371), (5543.378858785, -359.563611735), (5533.262204425, -359.563611735), align=None)
    extrude(amount=-CUT_EXTRUDE13_DEPTH, mode=Mode.SUBTRACT)


with BuildPart() as body_3_2_1:
    # Sketch27 → Boss-Extrude15 (new body)
    with BuildSketch(Plane.ZY.offset(270.545333837)):
        Polygon((5542.685251894, -352.64363238), (5528.998160793, -345.543277445), (5542.685251894, -345.379522228), align=None)
    extrude(amount=-BOSS_EXTRUDE15_DEPTH)


with BuildPart() as body_4_2:
    # Mirror11: mirrored copy
    add(body_2_2.part.mirror(Plane.ZY.offset(249.845333837)))


with BuildPart() as body_5:
    # Mirror11 2: mirrored copy
    add(body_3_2_1.part.mirror(Plane.ZY.offset(249.845333837)))


solid = Compound([part_4.part, body_2_2.part, body_3_2_1.part, body_4_2.part, body_5.part])
